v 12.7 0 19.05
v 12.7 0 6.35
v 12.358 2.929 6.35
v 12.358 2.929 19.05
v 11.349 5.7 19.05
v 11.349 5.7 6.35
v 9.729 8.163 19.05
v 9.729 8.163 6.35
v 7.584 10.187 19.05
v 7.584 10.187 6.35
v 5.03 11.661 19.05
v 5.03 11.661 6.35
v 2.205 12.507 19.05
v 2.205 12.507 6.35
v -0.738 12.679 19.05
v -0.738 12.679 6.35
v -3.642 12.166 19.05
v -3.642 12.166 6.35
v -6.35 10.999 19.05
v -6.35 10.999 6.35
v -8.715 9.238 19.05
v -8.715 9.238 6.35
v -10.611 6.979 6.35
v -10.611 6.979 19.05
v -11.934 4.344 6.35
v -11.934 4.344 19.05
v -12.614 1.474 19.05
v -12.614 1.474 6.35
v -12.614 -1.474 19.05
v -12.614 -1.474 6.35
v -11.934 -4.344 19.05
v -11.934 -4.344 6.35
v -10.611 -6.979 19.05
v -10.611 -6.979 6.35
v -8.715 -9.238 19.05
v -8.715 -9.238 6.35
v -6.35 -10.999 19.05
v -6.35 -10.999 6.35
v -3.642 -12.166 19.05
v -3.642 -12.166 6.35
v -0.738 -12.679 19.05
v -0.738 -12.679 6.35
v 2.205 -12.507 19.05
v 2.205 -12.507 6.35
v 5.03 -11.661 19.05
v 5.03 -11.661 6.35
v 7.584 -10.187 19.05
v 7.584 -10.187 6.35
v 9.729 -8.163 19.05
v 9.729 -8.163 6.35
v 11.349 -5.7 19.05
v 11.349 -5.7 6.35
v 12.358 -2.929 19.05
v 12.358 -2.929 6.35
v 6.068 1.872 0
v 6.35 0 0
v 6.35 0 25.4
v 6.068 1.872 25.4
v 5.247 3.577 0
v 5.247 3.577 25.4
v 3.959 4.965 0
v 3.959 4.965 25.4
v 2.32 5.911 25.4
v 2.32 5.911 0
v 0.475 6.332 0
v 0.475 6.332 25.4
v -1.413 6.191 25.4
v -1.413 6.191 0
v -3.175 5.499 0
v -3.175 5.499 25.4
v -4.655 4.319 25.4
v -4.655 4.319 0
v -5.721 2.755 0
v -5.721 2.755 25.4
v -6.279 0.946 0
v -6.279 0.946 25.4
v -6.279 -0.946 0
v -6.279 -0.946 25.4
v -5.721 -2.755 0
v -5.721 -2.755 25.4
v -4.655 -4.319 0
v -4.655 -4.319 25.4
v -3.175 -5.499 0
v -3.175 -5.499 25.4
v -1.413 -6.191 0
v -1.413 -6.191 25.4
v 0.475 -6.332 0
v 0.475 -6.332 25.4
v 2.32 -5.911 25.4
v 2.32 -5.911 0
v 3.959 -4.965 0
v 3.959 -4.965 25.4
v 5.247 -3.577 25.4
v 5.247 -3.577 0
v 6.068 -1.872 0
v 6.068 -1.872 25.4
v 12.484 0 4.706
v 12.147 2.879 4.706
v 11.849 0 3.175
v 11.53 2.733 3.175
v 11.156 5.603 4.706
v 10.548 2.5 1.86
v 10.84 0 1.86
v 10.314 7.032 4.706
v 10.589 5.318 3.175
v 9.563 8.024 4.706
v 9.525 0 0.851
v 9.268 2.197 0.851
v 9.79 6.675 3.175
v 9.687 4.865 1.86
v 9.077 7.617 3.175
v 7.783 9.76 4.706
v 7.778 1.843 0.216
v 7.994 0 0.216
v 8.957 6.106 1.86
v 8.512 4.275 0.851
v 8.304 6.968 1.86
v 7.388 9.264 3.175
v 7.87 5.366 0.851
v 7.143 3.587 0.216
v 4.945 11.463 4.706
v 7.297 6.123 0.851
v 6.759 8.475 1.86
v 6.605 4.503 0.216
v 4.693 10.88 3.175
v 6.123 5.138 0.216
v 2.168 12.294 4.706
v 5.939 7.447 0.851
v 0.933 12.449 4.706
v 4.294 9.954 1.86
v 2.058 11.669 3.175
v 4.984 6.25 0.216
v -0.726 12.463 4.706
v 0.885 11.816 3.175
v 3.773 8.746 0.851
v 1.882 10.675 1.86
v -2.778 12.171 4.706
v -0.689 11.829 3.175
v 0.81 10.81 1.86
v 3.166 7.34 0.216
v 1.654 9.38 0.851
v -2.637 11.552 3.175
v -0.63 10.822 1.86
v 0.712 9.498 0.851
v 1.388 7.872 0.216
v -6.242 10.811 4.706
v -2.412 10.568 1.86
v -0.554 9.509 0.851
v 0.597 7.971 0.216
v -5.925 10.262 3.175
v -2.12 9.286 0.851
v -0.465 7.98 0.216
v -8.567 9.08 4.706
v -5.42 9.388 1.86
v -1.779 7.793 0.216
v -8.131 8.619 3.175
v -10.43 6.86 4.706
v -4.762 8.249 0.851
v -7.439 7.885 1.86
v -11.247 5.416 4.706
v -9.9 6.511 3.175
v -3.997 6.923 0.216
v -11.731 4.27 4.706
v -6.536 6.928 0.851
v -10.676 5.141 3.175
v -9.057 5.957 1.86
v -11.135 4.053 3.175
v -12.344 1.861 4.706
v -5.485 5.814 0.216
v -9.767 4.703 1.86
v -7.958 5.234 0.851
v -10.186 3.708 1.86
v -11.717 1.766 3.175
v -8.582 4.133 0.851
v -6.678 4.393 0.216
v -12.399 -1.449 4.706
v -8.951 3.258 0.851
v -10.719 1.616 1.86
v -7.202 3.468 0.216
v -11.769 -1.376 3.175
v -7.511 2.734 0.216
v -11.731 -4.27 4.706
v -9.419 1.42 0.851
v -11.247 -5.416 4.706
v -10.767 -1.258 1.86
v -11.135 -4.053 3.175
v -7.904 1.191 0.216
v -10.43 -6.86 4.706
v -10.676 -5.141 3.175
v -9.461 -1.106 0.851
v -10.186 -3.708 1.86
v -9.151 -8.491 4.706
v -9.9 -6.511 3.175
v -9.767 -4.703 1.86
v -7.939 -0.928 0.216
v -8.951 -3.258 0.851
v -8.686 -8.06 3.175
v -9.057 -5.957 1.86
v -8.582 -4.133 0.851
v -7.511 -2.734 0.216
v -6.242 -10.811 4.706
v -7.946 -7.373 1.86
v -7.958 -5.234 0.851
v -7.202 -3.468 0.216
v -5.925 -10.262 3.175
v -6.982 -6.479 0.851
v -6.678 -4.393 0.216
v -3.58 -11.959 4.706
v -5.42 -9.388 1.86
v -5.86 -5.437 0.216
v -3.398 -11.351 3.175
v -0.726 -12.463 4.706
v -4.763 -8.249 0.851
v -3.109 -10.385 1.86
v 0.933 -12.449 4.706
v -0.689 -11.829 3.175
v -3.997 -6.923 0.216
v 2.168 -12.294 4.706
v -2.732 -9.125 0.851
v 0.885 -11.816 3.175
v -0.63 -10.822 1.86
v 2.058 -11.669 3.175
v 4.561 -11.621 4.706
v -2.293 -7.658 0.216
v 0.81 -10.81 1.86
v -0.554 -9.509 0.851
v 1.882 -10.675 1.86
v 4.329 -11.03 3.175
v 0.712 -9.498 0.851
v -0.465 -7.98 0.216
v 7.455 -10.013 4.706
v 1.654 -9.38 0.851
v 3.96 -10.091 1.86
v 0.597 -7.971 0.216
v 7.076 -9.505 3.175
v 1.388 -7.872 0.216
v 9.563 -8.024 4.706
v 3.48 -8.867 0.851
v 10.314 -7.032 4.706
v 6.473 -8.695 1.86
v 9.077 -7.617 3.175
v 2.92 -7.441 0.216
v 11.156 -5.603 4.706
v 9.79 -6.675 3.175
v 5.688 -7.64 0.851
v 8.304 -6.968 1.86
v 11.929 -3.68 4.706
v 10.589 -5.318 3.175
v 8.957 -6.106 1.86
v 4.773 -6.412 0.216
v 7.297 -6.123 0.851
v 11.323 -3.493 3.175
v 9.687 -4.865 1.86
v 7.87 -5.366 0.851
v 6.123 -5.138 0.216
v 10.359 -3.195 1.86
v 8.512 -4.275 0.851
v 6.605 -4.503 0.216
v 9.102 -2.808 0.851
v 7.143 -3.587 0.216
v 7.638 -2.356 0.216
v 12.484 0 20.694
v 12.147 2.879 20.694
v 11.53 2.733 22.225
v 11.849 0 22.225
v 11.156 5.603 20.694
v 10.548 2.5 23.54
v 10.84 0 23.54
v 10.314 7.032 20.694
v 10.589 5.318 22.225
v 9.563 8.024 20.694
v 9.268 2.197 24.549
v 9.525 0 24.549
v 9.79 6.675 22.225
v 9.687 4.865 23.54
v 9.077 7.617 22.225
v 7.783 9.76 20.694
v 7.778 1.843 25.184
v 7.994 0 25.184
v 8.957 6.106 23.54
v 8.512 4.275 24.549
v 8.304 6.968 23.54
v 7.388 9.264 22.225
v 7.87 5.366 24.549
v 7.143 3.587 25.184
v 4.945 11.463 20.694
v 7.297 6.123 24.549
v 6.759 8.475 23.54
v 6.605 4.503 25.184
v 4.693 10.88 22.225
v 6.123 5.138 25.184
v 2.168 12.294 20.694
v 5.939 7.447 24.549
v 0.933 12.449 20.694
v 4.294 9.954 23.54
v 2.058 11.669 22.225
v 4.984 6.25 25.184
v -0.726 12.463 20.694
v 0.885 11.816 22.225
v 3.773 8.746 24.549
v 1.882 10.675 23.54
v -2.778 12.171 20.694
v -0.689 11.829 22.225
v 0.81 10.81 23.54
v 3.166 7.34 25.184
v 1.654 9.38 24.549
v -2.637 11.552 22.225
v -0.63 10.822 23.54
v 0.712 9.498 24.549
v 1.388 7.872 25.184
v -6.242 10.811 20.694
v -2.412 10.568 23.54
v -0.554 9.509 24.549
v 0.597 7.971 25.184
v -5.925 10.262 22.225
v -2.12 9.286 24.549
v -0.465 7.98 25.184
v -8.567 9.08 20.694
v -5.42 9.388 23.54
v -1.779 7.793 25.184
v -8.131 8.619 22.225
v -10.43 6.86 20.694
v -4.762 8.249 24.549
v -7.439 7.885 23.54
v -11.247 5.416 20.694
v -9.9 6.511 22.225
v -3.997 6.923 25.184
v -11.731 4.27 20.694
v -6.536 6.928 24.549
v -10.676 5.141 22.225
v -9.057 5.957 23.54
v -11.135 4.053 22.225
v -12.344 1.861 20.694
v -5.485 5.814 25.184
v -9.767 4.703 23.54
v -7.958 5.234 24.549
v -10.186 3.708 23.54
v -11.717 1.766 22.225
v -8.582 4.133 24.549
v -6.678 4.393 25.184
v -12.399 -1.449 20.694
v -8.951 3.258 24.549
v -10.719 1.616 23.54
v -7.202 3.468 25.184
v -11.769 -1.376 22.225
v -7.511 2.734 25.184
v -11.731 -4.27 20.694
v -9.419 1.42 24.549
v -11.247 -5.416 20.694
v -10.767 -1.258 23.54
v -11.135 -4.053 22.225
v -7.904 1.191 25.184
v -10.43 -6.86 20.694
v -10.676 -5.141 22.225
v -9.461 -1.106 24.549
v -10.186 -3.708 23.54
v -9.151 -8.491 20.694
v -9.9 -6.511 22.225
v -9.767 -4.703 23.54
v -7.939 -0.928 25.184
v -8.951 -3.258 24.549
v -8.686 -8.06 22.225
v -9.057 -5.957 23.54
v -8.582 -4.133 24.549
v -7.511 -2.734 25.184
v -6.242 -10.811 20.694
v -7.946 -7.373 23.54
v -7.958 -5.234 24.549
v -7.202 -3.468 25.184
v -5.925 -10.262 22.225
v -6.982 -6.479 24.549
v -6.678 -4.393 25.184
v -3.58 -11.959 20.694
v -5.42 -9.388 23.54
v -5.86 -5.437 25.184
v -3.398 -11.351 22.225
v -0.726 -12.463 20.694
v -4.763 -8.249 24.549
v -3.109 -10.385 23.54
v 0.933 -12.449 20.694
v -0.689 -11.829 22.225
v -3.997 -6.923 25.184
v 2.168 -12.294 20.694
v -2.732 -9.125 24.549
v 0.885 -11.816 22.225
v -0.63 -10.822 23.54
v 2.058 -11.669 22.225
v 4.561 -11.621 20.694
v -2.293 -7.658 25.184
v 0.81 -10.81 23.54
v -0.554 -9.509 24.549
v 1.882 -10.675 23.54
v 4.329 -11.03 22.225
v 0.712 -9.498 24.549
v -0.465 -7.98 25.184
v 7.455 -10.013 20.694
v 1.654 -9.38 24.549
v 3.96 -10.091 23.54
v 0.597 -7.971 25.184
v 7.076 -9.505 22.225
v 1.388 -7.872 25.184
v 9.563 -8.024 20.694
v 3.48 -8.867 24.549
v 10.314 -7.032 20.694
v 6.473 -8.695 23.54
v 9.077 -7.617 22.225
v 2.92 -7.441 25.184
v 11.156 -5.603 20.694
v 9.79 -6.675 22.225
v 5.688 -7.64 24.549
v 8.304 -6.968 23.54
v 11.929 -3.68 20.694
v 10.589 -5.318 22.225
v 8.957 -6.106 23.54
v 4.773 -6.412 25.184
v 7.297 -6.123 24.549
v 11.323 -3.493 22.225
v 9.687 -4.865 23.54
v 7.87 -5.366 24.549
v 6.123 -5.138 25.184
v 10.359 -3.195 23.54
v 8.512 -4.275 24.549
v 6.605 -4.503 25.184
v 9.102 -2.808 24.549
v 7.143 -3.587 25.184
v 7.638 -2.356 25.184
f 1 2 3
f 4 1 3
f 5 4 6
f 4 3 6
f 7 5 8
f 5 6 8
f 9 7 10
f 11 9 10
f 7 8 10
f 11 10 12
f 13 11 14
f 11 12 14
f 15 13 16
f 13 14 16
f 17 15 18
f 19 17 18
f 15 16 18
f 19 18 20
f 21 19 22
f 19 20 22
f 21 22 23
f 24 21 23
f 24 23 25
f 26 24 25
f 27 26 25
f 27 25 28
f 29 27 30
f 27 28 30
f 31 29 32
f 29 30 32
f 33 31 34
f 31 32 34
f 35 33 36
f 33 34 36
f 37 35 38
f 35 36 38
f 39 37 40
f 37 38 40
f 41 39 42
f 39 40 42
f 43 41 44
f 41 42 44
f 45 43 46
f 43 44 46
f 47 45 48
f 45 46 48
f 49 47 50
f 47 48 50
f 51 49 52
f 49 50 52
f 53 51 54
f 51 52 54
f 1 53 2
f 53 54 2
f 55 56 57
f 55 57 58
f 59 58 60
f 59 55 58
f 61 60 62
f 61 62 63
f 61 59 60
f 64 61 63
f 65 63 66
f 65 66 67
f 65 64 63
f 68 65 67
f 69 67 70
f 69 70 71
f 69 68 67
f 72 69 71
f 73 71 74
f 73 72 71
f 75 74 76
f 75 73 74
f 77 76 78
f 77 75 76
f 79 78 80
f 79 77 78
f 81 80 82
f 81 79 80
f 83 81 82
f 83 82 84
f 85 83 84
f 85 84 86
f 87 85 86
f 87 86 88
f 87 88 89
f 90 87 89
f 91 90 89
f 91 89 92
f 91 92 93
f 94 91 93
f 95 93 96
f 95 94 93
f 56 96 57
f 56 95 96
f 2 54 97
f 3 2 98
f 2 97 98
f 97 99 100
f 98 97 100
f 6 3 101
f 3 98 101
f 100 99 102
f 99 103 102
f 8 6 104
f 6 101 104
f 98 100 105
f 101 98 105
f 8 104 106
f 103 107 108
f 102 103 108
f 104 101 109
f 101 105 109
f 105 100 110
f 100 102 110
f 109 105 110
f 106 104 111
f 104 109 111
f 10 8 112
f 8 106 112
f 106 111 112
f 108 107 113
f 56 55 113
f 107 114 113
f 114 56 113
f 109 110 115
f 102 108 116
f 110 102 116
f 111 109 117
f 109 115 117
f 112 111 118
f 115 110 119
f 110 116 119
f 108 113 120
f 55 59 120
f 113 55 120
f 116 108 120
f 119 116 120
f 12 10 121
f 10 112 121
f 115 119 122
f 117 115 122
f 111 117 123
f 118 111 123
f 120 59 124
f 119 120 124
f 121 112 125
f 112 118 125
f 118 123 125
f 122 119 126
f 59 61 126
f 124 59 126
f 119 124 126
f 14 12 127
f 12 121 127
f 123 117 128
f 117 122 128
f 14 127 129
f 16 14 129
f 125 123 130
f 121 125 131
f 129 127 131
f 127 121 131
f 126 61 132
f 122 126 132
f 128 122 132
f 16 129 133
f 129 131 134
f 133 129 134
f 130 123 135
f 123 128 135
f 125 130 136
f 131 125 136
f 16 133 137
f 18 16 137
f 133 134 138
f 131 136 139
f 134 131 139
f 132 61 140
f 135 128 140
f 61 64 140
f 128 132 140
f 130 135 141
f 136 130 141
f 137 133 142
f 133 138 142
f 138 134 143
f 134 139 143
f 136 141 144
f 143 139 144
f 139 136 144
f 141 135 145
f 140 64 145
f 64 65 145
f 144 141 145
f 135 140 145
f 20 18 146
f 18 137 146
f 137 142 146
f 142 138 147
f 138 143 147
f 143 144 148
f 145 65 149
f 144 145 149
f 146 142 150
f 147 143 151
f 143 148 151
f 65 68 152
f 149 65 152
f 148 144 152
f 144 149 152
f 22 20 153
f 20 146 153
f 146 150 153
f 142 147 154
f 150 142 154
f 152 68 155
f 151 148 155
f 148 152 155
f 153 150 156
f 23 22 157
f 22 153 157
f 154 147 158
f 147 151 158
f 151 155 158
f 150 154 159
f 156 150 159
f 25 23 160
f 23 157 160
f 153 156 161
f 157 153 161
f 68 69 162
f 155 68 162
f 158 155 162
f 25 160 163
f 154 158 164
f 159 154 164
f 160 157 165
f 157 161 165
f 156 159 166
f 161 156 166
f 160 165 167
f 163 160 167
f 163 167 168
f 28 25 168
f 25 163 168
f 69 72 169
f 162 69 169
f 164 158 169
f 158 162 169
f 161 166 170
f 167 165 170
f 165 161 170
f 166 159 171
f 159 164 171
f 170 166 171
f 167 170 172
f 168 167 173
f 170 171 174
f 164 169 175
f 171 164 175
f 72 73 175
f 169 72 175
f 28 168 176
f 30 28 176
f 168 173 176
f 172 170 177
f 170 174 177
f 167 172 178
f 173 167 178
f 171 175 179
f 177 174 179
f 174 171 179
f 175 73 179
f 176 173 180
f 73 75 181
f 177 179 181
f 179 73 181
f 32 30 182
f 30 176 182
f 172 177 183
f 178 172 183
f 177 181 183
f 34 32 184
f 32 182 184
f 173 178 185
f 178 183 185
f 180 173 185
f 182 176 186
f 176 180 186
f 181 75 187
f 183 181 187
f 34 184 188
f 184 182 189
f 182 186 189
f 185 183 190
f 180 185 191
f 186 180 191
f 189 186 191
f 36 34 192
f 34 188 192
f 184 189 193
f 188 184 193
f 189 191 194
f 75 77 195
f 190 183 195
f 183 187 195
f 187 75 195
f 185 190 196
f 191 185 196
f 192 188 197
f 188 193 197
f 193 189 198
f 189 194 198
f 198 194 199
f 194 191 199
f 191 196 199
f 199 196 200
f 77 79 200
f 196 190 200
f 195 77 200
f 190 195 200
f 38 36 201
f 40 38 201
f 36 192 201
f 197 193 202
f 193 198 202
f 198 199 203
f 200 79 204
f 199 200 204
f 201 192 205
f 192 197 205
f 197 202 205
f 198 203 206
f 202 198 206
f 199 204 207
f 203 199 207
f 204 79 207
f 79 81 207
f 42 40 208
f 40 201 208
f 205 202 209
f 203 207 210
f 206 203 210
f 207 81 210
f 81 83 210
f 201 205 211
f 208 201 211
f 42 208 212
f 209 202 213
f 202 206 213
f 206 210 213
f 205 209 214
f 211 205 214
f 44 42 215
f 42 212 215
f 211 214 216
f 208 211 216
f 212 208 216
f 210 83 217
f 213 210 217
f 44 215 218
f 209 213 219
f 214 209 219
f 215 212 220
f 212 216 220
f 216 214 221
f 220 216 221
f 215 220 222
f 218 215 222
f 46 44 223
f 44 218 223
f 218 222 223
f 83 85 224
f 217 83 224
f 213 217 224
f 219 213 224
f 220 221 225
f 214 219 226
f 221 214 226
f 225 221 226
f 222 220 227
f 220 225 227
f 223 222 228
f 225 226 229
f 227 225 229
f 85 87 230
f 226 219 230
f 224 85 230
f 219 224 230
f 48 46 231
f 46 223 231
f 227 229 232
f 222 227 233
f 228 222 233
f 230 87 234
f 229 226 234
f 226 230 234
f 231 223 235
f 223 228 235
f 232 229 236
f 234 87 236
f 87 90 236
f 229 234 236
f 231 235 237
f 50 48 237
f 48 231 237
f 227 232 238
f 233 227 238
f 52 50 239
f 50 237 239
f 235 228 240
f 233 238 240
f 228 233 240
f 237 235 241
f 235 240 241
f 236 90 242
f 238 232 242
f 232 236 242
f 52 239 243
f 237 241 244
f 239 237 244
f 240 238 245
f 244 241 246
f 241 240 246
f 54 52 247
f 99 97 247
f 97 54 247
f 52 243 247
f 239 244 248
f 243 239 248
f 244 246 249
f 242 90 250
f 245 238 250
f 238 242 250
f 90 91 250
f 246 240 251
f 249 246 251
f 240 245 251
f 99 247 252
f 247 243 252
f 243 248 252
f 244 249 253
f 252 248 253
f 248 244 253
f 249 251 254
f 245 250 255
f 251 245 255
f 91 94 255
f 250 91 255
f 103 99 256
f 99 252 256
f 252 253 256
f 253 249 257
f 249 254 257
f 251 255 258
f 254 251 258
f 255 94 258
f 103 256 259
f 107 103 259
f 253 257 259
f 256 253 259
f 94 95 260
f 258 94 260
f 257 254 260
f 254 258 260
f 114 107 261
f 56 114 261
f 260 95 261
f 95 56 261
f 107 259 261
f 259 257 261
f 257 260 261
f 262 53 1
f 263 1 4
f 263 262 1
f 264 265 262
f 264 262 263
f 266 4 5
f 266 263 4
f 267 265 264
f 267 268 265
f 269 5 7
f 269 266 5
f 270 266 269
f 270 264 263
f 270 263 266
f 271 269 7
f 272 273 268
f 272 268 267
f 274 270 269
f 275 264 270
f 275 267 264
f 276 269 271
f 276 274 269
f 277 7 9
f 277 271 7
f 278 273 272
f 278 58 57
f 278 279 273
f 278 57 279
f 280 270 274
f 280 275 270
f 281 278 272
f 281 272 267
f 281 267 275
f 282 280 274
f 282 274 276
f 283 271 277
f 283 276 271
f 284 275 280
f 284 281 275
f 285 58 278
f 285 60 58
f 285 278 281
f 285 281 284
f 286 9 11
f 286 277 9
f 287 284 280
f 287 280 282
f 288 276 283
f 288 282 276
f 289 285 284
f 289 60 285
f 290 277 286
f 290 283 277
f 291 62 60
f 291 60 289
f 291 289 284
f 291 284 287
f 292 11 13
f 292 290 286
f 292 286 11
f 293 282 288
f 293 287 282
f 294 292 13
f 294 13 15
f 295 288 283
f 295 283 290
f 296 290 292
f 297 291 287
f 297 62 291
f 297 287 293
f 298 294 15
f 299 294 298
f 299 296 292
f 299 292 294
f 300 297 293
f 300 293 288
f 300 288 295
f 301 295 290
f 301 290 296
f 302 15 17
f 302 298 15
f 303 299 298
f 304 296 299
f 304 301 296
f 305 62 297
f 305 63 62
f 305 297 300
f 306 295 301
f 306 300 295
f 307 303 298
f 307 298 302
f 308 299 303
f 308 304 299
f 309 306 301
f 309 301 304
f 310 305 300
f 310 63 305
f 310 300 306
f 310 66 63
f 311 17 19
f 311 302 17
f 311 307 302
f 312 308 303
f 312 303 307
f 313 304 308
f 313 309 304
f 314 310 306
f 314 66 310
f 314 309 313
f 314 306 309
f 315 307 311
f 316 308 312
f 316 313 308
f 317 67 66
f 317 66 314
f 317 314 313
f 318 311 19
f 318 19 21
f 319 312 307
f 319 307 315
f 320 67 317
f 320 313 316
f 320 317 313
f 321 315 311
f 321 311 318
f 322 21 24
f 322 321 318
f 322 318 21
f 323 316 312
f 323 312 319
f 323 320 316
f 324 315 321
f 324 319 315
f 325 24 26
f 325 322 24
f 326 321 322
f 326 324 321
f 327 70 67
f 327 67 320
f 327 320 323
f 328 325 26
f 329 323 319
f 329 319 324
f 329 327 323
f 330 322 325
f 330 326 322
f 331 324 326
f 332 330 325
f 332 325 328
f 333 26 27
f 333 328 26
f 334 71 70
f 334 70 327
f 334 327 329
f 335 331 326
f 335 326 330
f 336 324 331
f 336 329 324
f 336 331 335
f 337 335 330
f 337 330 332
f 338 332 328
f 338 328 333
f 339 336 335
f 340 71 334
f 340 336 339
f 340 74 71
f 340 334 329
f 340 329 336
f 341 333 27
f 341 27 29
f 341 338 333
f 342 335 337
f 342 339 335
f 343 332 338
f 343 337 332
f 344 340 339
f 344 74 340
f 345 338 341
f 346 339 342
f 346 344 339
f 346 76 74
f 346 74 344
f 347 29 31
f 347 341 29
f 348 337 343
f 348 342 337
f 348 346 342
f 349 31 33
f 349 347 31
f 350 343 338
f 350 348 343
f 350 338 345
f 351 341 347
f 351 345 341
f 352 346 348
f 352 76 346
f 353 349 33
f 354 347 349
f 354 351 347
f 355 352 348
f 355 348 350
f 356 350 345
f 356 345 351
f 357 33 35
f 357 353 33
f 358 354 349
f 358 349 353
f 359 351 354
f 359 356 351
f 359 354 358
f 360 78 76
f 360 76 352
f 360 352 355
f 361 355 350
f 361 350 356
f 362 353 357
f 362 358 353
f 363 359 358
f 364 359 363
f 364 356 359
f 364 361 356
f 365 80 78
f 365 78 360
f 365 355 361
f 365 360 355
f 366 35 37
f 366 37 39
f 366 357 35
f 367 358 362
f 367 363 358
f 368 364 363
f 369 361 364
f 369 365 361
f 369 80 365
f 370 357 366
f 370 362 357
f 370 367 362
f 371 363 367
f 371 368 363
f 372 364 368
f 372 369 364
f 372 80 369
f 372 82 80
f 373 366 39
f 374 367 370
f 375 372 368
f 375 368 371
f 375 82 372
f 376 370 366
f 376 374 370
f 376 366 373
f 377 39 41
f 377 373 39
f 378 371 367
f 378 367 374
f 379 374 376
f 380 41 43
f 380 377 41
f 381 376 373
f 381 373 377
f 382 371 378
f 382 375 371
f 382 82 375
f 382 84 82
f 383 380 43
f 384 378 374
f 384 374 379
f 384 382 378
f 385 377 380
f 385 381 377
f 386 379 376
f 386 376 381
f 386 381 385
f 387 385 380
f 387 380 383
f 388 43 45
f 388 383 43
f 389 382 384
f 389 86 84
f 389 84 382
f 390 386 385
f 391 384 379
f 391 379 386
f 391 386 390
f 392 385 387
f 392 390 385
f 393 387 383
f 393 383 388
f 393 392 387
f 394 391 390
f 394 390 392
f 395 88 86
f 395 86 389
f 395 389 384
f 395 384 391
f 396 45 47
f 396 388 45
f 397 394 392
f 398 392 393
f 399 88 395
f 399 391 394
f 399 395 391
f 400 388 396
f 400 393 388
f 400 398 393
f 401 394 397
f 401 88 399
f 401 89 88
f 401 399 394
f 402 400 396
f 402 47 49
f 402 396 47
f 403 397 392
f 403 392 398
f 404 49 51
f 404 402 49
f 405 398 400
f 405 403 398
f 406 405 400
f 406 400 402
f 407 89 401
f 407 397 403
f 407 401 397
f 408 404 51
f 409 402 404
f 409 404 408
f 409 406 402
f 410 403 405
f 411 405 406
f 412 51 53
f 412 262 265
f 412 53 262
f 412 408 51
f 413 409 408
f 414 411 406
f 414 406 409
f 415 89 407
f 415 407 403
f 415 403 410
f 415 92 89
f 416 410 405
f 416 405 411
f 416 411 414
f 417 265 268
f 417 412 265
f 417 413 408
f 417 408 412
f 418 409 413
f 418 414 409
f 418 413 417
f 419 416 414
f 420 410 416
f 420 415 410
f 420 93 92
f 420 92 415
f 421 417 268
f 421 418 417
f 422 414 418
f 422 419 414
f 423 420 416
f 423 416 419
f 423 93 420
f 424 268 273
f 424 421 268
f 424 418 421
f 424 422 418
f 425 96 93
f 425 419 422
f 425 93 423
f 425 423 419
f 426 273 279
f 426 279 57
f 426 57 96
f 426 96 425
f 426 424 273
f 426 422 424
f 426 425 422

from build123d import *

# Parameters (mm, degrees)
F0_R     = 12.7
F1_DEPTH = 25.4
F2_R     = 6.35
F3_R     = 6.35
F4_DEPTH = 25.4


with BuildPart() as f1:
    # F0 (on Top) → F1 (new body)
    with BuildSketch(Plane.XY):
        Circle(F0_R)
    extrude(amount=F1_DEPTH)

    # F2
    f2_edges = [f1.edges().sort_by_distance(p)[0] for p in [
        (12.7, 0, 12.7),
        (-12.7, 0, 0),
        (-12.7, 0, 25.4),
    ]]
    fillet(f2_edges, radius=F2_R)

    # F3 (on Top) → F4 (cut)
    with BuildSketch(Plane.XY):
        Circle(F3_R)
    extrude(amount=F4_DEPTH, mode=Mode.SUBTRACT)


solid = f1.part
